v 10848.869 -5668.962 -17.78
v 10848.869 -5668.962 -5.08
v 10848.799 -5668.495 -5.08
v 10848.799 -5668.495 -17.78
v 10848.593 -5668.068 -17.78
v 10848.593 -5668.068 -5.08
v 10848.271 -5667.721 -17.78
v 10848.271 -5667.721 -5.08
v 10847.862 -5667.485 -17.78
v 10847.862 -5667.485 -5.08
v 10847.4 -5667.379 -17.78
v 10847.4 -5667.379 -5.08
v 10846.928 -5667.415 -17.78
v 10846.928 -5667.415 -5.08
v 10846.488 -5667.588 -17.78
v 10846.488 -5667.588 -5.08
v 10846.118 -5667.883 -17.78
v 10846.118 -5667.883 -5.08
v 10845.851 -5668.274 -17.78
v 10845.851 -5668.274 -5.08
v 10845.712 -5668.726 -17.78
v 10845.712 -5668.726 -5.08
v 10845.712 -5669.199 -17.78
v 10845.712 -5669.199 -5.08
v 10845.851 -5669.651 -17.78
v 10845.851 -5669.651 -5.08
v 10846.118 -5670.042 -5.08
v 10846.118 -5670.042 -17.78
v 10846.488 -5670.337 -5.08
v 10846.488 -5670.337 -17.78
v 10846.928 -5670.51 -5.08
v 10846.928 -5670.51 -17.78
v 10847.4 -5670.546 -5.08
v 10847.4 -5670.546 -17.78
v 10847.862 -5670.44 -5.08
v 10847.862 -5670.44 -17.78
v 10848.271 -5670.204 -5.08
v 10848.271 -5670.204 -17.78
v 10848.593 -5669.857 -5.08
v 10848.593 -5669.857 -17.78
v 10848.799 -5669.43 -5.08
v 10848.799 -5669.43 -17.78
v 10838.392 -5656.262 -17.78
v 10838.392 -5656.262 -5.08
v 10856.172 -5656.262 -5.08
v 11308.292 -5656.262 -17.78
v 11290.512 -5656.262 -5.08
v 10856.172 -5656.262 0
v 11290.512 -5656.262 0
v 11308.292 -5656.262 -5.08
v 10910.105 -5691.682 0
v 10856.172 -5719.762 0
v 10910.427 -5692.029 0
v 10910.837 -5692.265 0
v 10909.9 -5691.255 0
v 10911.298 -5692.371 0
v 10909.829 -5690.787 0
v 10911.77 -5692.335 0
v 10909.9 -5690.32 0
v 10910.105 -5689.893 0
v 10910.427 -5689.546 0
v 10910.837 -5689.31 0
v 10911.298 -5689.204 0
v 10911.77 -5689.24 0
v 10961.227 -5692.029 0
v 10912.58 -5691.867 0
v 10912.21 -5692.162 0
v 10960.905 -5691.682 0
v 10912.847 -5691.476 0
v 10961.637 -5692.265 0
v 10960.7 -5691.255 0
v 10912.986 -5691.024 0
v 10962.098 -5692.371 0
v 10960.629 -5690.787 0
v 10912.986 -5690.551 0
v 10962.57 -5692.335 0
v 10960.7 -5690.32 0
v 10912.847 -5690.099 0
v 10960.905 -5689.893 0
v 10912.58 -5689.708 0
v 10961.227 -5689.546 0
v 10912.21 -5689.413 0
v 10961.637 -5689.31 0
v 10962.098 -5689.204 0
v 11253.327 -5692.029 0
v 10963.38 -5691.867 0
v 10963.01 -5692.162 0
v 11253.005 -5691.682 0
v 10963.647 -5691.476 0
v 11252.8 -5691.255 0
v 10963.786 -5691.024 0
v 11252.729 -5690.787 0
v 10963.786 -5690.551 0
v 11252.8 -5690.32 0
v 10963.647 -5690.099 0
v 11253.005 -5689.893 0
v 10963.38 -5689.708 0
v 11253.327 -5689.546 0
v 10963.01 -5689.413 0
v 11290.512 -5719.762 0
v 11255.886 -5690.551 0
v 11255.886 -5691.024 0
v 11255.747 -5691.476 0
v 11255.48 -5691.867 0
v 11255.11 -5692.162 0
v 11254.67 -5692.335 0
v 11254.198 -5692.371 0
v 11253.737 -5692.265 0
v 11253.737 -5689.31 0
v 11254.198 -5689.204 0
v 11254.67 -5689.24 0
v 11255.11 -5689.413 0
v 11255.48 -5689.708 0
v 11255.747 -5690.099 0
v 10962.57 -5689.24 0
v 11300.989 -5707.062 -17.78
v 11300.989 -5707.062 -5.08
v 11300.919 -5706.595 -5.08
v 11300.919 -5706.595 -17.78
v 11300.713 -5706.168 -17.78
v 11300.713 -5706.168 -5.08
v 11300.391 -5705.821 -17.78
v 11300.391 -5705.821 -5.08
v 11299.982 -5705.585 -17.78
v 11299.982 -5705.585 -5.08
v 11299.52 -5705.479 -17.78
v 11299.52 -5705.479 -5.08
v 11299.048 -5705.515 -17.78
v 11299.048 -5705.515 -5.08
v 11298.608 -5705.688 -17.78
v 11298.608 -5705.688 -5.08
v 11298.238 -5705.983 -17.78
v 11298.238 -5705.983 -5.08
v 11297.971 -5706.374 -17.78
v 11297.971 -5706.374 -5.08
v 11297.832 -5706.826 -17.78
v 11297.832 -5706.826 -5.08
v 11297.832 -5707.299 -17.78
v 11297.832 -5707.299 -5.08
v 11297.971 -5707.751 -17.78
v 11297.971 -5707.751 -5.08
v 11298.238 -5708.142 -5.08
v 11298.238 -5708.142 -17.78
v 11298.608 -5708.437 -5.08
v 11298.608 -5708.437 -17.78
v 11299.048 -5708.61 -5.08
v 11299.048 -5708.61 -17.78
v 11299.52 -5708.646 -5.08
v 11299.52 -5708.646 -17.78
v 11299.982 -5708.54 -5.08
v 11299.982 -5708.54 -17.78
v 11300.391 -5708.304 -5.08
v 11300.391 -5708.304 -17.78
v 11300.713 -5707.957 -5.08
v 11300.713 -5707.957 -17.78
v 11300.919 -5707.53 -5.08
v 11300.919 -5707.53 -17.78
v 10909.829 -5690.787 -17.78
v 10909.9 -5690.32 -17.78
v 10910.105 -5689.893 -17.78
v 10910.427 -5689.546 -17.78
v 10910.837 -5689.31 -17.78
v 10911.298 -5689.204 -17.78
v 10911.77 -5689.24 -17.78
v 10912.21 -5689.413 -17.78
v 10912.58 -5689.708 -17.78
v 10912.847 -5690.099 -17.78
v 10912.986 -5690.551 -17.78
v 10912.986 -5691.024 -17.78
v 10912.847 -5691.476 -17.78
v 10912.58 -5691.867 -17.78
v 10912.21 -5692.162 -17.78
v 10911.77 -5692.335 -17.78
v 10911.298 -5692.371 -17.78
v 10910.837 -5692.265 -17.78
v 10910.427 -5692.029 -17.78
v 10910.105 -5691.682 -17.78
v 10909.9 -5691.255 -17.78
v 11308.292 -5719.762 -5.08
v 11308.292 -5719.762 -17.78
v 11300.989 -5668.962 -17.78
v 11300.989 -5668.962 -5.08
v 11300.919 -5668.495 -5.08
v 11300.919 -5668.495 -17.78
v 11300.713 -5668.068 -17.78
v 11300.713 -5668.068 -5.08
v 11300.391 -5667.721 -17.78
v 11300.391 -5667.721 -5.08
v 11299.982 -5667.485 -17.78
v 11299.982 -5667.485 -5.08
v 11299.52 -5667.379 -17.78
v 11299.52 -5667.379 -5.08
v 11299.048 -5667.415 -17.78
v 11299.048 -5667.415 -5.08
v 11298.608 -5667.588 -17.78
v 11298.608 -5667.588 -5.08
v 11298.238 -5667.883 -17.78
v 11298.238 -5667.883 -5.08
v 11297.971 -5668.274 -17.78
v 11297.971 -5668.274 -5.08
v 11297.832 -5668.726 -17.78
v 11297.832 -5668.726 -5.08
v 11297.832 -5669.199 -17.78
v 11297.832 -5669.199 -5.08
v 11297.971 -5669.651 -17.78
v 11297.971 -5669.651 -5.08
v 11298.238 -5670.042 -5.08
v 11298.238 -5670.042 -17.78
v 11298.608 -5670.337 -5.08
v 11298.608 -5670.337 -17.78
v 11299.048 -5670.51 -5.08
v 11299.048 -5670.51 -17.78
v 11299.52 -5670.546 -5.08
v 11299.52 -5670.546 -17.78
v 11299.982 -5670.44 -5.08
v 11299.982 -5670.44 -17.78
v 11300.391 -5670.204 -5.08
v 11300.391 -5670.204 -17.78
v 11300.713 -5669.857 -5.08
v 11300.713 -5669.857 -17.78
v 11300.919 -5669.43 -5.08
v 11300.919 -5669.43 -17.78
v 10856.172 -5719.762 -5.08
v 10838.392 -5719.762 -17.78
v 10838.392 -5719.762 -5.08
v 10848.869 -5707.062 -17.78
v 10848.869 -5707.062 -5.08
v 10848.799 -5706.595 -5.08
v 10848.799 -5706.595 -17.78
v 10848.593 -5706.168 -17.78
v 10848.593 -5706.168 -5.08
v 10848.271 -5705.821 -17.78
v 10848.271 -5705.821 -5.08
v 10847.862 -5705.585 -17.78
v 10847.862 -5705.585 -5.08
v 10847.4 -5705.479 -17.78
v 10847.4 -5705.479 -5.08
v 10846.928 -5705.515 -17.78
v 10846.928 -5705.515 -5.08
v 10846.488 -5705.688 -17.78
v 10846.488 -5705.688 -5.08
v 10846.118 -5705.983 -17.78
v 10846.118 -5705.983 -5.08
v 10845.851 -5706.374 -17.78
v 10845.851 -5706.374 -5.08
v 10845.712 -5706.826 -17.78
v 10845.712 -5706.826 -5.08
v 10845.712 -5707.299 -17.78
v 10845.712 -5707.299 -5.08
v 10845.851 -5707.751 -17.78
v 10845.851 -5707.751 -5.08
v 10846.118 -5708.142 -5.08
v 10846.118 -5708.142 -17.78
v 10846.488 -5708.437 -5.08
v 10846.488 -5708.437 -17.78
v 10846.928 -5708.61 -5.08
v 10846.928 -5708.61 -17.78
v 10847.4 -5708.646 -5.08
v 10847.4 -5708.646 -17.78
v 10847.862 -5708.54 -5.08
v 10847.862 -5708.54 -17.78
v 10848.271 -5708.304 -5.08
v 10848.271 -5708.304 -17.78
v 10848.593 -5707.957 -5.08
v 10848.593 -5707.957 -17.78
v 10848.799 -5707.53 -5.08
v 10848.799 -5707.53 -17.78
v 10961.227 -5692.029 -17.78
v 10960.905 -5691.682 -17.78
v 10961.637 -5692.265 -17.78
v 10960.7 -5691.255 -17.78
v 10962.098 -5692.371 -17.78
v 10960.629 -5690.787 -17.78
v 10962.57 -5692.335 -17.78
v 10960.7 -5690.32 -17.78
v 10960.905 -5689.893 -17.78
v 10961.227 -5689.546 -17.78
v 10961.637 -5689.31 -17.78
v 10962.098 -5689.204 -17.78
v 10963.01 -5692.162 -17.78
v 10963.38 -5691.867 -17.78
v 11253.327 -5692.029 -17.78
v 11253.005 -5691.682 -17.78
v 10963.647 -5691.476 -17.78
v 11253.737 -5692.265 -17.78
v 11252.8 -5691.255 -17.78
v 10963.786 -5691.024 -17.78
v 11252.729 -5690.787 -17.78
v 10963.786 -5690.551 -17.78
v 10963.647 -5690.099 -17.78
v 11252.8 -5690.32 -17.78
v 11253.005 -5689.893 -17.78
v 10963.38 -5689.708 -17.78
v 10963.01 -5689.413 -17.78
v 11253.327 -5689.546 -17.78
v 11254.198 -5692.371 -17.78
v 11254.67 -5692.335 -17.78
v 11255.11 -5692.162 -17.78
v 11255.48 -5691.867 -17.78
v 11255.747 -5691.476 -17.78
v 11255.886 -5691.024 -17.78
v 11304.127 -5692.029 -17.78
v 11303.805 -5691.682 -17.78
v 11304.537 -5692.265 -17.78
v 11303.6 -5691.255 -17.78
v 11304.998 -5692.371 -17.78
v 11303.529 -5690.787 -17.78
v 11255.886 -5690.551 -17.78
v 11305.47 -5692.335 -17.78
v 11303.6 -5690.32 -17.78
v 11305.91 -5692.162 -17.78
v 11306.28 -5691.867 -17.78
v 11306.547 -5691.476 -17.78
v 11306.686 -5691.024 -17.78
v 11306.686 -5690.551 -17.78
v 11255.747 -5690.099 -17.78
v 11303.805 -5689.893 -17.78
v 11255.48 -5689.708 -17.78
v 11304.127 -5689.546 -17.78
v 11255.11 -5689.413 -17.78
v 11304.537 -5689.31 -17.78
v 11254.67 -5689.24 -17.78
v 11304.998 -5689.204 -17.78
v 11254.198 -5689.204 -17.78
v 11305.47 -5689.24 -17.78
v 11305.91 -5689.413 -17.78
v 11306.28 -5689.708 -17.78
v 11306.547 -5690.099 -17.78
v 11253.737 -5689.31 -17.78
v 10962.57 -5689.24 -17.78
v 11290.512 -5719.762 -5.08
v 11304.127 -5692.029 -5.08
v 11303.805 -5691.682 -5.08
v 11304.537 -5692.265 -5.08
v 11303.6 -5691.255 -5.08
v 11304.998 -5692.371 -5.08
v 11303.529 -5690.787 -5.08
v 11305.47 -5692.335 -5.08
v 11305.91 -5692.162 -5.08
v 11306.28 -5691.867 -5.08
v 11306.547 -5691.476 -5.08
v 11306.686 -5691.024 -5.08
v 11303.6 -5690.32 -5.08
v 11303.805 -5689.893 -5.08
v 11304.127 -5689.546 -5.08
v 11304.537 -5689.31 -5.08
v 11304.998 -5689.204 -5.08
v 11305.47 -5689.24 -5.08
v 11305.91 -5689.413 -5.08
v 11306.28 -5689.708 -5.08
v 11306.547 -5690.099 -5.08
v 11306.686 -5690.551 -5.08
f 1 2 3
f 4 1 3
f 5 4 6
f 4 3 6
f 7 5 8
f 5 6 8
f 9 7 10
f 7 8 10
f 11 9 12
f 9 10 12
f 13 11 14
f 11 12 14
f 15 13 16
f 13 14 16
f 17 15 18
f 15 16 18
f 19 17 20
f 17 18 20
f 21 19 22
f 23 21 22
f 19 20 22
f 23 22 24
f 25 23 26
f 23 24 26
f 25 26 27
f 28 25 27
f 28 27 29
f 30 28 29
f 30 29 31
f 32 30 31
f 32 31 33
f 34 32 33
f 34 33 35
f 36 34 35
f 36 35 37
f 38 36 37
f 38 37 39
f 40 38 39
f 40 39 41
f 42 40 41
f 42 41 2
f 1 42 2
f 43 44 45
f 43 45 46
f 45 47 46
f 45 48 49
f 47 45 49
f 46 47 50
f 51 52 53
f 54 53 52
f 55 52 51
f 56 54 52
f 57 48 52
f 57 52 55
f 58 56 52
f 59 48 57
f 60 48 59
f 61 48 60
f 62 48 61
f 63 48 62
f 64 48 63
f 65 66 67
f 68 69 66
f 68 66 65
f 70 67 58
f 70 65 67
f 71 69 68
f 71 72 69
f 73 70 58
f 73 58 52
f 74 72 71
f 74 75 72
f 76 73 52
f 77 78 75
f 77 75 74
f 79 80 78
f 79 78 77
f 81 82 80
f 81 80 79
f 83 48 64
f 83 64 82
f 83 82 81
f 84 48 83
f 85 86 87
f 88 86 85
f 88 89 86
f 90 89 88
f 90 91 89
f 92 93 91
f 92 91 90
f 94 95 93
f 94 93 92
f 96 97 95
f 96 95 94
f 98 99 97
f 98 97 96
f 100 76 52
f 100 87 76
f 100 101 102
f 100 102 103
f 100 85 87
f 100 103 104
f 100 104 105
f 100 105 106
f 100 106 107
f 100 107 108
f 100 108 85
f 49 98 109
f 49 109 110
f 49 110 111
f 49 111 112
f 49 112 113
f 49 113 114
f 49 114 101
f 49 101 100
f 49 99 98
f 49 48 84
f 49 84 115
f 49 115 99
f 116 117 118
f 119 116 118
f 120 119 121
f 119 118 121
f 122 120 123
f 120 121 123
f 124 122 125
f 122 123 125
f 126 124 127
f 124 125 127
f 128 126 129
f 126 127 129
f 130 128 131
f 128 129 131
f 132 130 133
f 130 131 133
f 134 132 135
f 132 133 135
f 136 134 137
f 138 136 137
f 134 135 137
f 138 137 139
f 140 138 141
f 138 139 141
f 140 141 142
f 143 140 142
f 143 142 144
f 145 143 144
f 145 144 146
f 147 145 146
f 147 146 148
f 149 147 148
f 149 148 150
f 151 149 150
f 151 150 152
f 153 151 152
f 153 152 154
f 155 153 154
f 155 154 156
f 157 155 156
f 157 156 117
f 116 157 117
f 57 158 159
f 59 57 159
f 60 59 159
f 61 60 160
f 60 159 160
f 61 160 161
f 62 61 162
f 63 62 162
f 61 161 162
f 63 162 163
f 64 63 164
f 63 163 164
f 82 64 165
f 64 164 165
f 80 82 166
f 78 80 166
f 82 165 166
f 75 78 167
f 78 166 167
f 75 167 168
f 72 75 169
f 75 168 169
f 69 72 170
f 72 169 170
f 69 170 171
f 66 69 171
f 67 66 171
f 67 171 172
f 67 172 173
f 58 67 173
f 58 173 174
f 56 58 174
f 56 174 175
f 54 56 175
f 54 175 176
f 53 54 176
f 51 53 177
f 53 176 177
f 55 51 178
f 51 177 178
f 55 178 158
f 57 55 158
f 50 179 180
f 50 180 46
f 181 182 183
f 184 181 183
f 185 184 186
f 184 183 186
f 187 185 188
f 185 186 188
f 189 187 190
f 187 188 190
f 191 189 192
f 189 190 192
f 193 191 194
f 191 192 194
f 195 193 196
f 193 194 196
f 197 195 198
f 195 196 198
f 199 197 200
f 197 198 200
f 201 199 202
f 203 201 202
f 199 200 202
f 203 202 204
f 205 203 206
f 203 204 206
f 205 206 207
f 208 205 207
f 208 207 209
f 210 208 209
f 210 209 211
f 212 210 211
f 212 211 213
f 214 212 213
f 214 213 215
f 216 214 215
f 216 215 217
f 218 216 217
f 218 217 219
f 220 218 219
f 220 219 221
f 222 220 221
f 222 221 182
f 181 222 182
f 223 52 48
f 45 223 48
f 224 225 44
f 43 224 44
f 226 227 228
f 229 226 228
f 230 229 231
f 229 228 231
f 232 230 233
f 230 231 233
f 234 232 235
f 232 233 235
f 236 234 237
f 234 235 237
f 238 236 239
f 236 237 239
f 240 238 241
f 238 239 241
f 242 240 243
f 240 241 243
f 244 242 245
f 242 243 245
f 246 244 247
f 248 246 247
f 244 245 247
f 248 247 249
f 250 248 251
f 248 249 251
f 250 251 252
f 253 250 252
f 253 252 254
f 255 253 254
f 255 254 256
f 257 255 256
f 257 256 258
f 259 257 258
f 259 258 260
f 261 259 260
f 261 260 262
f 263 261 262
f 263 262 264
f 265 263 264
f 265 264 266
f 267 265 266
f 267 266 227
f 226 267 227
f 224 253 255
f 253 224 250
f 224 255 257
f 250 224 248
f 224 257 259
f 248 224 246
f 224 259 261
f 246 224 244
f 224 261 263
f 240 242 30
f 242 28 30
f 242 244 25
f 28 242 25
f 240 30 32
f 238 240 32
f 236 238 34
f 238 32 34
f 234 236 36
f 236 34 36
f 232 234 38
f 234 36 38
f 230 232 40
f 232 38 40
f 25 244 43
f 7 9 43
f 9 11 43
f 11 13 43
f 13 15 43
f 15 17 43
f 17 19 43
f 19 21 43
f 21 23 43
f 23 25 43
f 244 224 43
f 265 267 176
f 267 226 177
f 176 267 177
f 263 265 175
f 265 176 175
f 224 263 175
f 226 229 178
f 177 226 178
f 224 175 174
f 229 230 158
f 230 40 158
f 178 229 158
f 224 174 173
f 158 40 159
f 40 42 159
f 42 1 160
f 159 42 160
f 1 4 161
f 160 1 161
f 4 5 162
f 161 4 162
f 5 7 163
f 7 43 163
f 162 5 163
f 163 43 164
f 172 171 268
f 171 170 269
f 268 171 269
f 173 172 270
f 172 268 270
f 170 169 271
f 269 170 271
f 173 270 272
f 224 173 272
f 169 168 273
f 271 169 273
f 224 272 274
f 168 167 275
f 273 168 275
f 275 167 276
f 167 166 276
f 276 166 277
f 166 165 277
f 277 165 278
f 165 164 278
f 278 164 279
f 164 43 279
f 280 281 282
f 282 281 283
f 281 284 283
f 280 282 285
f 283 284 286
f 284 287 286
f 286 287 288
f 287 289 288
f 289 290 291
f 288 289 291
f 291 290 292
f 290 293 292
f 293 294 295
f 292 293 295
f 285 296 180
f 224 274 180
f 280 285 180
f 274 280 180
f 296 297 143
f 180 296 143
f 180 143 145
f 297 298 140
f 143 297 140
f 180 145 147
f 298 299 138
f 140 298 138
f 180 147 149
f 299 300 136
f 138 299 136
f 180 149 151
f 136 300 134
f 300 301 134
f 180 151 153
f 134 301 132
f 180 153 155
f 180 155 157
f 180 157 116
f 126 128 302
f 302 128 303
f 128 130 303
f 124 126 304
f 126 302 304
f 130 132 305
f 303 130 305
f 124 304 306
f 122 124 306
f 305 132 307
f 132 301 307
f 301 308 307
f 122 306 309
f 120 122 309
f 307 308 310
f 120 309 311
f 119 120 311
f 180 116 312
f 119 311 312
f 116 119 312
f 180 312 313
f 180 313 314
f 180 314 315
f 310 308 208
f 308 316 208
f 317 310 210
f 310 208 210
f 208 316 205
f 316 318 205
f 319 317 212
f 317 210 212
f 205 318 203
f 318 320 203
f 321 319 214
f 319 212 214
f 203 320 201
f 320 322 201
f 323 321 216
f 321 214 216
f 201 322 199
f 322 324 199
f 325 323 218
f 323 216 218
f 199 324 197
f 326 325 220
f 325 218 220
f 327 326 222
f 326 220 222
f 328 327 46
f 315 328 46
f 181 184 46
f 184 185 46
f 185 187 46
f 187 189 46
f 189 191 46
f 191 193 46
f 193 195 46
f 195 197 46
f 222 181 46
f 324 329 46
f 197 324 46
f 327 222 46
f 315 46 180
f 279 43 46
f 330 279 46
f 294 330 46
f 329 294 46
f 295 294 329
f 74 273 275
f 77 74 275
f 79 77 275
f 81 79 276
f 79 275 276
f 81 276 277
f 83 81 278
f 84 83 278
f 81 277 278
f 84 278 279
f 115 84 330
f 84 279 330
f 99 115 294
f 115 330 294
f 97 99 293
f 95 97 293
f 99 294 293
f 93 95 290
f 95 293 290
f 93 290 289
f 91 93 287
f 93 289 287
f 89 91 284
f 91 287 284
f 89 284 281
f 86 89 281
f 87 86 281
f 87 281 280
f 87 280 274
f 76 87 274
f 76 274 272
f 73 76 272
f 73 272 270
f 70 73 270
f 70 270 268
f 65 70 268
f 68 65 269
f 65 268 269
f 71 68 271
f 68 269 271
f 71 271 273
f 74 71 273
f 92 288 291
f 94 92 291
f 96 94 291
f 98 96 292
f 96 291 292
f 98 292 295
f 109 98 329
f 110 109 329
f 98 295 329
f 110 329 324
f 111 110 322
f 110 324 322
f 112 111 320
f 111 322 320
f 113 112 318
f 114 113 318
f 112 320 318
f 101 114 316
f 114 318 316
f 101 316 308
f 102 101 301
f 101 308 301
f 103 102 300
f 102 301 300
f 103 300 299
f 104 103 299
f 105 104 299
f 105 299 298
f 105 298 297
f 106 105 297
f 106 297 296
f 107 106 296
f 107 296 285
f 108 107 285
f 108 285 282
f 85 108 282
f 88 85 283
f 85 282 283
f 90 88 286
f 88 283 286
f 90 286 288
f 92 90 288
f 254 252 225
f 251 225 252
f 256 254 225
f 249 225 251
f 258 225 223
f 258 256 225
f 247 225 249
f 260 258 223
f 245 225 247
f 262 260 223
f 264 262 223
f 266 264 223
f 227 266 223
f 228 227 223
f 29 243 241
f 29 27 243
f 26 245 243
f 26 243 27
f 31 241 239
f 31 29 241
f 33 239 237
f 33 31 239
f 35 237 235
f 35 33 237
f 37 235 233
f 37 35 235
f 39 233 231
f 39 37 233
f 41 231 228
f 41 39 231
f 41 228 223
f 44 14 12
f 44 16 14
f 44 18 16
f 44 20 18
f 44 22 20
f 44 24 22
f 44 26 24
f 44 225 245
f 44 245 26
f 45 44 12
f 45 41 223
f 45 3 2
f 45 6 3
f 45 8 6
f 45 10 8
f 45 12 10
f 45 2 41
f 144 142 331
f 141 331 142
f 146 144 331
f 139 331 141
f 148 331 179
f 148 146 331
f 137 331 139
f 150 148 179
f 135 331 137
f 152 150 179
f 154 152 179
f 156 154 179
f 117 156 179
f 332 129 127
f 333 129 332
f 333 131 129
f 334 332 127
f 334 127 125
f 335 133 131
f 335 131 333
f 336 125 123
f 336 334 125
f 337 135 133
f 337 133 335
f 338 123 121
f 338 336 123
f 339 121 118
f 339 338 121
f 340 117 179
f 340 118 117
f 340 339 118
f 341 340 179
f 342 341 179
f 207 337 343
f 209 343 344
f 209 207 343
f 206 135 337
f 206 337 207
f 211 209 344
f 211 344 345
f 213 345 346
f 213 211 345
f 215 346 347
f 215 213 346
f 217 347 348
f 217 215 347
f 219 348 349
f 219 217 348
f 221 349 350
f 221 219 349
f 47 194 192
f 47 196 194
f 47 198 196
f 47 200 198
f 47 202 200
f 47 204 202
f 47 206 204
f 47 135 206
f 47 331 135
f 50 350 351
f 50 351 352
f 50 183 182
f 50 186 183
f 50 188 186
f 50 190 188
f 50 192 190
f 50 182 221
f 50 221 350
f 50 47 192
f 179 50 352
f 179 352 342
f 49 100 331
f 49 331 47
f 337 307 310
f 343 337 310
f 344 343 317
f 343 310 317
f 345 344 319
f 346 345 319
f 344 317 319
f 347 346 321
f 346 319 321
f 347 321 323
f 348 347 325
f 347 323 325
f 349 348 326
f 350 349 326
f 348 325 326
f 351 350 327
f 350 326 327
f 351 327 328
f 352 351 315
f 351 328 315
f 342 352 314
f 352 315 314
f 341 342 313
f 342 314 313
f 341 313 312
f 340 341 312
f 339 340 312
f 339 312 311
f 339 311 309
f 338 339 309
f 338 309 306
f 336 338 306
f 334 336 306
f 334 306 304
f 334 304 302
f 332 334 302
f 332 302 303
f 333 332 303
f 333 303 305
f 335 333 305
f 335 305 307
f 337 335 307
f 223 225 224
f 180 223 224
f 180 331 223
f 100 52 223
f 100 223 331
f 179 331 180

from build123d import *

# Parameters (mm, degrees)
SKETCH2_W          = 469.9
SKETCH2_H          = 63.5
EXTRUDE1_DEPTH     = 17.78
SKETCH3_W          = 17.78
SKETCH3_H          = 63.5
CUT_EXTRUDE1_DEPTH = 5.08
SKETCH4_R          = 1.5875
CUT_EXTRUDE2_DEPTH = 17.78
SKETCH5_R          = 1.5875
CUT_EXTRUDE3_DEPTH = 17.78


with BuildPart() as part:
    # Sketch2 → Extrude1 (new body)
    with BuildSketch(Plane.XY):
        with Locations((11073.341666666, -5688.0125)):
            Rectangle(SKETCH2_W, SKETCH2_H)
    extrude(amount=-EXTRUDE1_DEPTH)

    # Sketch3 → Cut-Extrude1 (cut)
    with BuildSketch(Plane.XY):
        with Locations((11299.401666666, -5688.0125)):
            Rectangle(SKETCH3_W, SKETCH3_H)
        with Locations((10847.281666666, -5688.0125)):
            Rectangle(SKETCH3_W, SKETCH3_H)
    extrude(amount=-CUT_EXTRUDE1_DEPTH, mode=Mode.SUBTRACT)

    # Sketch4 → Cut-Extrude2 (cut)
    with BuildSketch(Plane.XY):
        with Locations((10847.281666666, -5668.9625)):
            Circle(SKETCH4_R)
        with Locations((10847.281666666, -5707.0625)):
            Circle(SKETCH4_R)
        with Locations((11299.401666666, -5707.0625)):
            Circle(SKETCH4_R)
        with Locations((11299.401666666, -5668.9625)):
            Circle(SKETCH4_R)
    extrude(amount=-CUT_EXTRUDE2_DEPTH, mode=Mode.SUBTRACT)

    # Sketch5 → Cut-Extrude3 (cut)
    with BuildSketch(Plane(origin=(0, 0, -17.78), x_dir=(-1, 0, 0), z_dir=(0, 0, -1))):
        with Locations((-10911.416666665, -5690.78745)):
            Circle(SKETCH5_R)
        with Locations((-10962.216666665, -5690.78745)):
            Circle(SKETCH5_R)
        with Locations((-11254.316666665, -5690.78745)):
            Circle(SKETCH5_R)
        with Locations((-11305.116666665, -5690.78745)):
            Circle(SKETCH5_R)
    extrude(amount=-CUT_EXTRUDE3_DEPTH, mode=Mode.SUBTRACT)


solid = part.part
